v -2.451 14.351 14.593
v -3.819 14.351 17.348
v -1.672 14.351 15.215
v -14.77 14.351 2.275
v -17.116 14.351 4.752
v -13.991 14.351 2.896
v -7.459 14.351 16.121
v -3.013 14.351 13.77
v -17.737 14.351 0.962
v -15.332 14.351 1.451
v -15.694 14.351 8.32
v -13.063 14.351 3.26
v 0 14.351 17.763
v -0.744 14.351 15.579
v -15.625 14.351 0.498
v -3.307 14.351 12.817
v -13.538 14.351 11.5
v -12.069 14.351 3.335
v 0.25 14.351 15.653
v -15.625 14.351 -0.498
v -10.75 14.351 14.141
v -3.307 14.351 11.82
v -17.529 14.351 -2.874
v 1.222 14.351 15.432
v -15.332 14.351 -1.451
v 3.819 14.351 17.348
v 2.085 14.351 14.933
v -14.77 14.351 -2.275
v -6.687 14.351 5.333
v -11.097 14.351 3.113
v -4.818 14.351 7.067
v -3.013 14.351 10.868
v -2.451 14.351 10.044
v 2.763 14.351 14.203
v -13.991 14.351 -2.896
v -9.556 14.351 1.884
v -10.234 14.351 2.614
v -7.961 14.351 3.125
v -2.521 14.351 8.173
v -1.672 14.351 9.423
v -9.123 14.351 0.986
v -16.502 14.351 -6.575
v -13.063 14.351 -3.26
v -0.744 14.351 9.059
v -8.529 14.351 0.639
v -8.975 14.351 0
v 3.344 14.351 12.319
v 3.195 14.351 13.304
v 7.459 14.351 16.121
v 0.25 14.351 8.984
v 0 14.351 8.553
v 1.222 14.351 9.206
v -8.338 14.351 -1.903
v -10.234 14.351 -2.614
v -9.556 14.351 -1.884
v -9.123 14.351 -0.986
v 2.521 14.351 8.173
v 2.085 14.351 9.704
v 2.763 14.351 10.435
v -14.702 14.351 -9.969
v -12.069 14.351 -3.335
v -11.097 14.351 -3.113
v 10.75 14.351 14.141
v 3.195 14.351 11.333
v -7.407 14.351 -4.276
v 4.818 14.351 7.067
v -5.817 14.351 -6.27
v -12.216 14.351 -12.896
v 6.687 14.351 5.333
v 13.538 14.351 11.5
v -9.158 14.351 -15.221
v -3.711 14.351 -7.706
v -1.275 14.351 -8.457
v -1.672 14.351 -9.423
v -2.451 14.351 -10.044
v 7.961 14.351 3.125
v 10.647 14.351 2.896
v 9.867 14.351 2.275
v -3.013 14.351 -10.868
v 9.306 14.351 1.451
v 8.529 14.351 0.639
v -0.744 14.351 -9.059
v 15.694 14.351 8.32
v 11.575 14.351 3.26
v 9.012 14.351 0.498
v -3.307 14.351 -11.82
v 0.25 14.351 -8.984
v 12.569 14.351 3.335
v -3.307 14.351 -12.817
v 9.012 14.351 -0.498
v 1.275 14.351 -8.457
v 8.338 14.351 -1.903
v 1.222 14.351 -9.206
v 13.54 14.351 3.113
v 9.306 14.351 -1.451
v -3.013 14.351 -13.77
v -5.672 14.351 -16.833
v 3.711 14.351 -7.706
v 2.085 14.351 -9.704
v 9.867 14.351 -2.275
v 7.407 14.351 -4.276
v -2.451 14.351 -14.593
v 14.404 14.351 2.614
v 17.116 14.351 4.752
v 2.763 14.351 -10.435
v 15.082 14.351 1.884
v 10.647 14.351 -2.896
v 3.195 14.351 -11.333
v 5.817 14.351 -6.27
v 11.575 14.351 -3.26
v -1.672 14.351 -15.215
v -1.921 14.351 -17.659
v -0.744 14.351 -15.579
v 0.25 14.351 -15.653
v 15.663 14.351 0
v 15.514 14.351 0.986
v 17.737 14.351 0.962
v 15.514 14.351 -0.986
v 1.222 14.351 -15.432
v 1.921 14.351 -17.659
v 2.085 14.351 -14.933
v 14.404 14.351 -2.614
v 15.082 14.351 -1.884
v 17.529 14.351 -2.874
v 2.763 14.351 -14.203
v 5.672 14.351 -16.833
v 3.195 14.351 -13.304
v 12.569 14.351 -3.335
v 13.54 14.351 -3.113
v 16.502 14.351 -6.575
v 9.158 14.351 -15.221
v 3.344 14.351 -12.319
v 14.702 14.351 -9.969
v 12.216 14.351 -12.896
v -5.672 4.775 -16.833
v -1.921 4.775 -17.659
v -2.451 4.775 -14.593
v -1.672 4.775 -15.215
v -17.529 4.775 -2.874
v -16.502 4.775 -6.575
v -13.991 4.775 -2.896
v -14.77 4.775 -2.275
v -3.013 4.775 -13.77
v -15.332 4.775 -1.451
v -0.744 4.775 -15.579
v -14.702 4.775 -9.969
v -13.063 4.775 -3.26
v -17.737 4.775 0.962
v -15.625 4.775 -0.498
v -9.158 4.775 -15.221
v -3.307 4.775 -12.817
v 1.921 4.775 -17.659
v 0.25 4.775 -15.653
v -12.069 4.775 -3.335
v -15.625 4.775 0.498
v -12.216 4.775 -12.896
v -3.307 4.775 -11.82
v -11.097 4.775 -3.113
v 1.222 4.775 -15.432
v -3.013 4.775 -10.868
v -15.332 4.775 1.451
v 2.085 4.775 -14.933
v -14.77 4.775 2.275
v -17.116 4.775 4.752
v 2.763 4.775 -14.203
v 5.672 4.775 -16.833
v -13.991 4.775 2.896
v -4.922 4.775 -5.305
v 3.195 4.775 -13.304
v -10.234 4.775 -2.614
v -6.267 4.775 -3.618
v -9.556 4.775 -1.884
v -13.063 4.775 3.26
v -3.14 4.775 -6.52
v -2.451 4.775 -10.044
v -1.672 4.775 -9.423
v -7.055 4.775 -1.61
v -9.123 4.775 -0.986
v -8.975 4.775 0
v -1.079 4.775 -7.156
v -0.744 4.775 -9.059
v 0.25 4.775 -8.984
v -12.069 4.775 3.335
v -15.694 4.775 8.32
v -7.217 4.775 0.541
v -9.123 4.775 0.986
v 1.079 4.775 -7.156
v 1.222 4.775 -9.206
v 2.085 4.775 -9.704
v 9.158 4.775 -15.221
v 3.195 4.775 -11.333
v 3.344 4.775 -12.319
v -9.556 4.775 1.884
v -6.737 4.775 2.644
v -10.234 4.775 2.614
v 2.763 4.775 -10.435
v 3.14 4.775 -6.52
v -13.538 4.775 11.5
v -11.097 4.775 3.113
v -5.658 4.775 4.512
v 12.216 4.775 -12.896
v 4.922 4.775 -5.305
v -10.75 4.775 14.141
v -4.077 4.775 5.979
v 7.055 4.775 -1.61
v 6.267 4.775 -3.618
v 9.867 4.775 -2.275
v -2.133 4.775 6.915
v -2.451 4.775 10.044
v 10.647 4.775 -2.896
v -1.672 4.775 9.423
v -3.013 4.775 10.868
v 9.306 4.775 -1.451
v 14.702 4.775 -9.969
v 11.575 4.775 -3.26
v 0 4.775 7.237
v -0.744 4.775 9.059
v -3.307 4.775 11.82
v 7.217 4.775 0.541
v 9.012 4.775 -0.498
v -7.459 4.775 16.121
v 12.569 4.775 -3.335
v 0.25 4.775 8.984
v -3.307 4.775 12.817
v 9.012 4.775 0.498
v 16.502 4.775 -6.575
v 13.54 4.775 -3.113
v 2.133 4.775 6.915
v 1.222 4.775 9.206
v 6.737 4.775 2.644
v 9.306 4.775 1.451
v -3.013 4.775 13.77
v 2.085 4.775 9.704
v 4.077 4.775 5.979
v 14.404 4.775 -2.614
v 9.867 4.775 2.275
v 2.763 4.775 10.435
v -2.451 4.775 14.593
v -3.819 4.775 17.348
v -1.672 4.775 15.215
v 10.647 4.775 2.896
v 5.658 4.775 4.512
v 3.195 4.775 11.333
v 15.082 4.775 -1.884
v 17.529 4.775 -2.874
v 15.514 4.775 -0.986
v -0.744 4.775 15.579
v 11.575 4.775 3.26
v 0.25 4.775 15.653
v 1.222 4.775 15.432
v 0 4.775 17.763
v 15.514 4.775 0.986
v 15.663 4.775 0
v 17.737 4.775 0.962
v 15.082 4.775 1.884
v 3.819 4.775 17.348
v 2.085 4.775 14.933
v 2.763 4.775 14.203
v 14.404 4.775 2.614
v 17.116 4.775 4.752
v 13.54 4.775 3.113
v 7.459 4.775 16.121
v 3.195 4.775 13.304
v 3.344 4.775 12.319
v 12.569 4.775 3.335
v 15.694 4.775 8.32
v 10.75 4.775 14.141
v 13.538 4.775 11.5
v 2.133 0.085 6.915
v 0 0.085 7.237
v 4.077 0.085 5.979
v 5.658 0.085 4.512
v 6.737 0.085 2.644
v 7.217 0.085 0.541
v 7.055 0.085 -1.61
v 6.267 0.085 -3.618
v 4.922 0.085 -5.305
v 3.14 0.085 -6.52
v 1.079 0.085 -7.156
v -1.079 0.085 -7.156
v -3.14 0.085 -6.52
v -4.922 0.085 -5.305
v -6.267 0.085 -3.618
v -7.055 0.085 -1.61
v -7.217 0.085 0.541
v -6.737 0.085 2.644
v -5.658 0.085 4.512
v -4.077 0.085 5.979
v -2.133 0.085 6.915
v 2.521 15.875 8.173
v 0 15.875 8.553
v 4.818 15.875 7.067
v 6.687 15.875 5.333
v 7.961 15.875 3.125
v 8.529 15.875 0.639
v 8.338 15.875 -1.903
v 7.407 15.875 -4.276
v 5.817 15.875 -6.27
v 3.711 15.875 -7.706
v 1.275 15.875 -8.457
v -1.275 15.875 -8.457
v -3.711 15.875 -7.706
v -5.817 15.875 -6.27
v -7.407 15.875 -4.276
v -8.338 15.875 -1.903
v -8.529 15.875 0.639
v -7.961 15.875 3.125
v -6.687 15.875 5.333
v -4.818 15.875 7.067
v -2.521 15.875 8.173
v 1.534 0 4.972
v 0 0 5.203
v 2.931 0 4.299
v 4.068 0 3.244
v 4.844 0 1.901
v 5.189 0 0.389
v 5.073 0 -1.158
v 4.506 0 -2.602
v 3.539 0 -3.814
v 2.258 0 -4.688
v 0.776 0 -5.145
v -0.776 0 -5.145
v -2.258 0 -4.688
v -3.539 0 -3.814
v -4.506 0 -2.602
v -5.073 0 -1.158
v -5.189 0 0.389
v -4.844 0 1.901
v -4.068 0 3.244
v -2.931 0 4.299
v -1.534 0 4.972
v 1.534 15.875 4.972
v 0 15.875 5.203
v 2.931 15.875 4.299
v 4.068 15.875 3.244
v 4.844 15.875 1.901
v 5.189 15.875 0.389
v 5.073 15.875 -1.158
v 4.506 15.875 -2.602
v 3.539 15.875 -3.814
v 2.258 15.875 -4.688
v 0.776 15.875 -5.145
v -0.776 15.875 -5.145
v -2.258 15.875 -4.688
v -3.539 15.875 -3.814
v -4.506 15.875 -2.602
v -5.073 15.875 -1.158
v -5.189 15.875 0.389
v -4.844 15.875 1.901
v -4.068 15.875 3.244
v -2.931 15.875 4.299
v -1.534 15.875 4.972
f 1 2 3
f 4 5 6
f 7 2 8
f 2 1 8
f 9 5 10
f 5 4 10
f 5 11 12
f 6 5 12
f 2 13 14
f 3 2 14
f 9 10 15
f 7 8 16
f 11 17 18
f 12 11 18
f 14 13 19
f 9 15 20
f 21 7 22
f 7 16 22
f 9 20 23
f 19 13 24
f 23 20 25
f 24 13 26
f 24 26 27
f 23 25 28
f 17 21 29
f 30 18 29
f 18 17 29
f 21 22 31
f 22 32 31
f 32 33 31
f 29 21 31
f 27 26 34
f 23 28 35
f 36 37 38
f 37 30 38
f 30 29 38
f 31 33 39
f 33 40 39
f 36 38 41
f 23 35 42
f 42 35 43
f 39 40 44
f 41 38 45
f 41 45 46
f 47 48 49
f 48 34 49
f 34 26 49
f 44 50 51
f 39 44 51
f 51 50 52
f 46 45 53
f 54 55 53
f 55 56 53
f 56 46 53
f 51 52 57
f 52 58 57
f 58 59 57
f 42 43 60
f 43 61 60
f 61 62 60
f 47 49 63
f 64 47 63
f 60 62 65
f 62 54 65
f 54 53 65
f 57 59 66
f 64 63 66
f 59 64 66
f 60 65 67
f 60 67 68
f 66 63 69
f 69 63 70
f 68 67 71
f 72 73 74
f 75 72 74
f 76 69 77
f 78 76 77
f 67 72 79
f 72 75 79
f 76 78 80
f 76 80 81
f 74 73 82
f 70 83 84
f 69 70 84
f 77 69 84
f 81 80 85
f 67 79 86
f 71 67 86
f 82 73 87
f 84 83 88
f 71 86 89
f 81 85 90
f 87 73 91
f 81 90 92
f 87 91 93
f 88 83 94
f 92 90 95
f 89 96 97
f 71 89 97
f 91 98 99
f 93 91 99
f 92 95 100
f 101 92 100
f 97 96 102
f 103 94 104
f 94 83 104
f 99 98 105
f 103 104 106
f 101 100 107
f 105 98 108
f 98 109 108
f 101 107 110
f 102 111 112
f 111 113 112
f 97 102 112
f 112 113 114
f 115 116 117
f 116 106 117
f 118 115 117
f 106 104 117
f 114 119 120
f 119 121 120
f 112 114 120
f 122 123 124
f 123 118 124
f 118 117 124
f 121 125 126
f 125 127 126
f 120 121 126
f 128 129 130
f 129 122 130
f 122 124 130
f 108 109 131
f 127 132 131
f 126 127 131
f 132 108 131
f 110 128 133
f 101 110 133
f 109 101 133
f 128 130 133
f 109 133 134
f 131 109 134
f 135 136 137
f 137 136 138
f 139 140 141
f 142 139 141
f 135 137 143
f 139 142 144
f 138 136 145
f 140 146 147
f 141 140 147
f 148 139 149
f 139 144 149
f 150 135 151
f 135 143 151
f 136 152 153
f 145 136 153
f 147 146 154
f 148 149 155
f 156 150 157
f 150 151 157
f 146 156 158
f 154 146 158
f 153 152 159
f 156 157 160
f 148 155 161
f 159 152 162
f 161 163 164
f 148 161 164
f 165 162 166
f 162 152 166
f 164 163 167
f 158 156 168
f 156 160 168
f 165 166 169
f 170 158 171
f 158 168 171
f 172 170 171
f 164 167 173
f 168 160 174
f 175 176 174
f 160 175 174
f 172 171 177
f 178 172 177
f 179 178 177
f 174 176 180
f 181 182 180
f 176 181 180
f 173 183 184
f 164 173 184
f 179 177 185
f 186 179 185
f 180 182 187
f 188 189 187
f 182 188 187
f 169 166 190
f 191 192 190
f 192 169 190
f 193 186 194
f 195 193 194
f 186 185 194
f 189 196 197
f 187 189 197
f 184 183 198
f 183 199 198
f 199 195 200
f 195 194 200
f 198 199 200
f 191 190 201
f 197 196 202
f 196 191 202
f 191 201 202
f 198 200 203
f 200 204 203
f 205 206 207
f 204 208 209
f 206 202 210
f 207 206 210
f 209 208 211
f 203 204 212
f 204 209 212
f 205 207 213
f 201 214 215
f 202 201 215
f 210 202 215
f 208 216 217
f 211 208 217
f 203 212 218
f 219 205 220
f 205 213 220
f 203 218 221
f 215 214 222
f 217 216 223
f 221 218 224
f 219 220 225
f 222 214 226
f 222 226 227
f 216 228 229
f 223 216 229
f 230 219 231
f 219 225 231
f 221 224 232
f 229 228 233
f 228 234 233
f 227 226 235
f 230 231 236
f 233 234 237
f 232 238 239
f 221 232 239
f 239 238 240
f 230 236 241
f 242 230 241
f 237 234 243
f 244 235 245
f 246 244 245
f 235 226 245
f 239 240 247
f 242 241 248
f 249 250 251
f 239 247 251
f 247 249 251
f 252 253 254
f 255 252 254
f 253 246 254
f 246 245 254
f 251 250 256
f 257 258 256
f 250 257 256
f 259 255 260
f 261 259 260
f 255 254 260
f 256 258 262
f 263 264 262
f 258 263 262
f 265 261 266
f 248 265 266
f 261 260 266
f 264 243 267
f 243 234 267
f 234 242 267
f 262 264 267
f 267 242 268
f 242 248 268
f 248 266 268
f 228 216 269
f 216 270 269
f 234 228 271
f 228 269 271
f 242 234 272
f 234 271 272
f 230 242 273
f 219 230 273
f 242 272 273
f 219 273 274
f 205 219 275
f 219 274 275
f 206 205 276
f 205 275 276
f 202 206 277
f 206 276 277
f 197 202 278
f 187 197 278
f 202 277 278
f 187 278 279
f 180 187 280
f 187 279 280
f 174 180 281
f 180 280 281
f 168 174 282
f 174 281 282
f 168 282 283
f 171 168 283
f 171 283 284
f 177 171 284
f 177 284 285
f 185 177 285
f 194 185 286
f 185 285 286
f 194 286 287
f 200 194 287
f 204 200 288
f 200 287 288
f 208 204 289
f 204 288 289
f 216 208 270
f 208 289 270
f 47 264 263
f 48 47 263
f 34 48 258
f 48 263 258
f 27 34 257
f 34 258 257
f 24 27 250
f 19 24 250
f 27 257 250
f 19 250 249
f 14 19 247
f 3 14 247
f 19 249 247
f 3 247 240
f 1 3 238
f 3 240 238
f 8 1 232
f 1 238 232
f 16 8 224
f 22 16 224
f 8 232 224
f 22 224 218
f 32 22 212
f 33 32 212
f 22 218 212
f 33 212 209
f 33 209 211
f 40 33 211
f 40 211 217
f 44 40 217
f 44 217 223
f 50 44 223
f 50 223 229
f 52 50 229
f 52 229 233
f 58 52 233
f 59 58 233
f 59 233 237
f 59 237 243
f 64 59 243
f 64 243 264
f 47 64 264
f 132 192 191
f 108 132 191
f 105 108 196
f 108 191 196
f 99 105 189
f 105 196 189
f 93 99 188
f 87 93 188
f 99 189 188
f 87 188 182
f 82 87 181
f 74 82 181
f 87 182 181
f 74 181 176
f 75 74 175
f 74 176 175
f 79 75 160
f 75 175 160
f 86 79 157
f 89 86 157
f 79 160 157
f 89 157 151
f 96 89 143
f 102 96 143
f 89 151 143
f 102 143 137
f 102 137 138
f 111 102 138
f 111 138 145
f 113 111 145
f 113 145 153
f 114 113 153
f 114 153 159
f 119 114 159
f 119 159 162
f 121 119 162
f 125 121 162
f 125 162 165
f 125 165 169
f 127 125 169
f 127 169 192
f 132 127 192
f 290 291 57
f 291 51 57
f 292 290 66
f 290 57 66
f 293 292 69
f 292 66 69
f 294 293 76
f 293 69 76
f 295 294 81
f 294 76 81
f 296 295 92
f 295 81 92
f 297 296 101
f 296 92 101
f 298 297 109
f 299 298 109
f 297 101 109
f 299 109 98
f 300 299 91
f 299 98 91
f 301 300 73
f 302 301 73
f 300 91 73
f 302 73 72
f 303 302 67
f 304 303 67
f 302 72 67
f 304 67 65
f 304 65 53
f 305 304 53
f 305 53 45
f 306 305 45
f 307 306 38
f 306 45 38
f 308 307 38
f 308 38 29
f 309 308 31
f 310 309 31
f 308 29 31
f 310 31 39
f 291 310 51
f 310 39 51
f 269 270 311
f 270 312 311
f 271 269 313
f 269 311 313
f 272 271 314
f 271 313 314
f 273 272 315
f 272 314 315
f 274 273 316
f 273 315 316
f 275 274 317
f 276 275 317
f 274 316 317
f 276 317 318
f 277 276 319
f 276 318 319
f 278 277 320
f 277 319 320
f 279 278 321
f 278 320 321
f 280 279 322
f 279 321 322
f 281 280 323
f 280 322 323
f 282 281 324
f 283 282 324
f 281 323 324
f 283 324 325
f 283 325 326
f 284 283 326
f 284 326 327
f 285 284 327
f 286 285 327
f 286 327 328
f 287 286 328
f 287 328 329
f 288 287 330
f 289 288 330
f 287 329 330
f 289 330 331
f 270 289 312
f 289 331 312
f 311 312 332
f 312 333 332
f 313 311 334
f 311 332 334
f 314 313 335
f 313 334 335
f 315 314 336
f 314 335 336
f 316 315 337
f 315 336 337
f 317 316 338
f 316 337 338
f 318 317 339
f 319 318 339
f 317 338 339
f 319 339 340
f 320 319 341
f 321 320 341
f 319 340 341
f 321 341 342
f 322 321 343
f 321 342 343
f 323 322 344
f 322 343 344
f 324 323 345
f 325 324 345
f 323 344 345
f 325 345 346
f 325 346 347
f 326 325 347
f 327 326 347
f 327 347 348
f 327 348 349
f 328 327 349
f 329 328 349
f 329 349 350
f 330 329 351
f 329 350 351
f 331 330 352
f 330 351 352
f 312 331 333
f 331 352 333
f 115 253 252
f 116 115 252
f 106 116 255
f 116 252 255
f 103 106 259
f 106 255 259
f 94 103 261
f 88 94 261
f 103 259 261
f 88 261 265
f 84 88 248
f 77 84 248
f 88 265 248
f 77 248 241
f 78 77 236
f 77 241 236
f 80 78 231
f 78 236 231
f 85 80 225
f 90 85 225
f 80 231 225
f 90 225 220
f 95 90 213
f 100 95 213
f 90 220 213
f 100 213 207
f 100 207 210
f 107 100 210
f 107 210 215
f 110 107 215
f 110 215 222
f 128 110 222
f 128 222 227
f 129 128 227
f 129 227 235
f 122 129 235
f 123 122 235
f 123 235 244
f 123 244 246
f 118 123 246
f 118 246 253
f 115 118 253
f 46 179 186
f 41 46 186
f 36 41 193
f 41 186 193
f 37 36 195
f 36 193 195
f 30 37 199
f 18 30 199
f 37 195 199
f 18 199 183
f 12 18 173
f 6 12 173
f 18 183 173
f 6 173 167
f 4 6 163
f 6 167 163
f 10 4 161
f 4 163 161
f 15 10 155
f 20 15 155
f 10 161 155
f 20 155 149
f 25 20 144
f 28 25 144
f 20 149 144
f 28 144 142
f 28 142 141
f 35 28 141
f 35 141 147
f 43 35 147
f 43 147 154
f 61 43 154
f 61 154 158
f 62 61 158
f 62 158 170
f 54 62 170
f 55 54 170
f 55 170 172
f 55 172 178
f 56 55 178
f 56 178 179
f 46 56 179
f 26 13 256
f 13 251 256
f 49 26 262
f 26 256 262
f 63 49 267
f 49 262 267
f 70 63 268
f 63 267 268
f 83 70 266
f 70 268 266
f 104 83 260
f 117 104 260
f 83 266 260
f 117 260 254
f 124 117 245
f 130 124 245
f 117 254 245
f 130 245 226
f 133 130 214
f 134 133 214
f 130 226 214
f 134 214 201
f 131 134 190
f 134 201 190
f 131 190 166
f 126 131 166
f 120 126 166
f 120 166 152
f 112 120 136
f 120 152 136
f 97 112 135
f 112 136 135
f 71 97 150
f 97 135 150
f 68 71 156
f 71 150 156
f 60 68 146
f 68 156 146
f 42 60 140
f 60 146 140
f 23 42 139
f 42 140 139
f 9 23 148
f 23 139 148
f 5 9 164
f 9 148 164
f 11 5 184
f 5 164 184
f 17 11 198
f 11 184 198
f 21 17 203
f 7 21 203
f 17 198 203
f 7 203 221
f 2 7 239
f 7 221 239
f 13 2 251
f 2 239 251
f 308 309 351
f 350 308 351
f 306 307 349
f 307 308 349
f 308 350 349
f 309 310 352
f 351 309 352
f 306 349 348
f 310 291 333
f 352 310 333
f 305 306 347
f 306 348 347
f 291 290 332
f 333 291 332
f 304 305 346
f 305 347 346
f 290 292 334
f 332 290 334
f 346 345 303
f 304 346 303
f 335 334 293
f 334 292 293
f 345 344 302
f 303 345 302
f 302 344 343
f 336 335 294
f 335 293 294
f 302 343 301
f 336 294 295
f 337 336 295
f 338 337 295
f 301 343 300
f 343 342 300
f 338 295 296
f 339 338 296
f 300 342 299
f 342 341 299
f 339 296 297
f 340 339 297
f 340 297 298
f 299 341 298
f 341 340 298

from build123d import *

# Parameters (mm, degrees)
F2_R     = 3.344047
F3_DEPTH = 11.1008


with BuildPart() as f1:
    # F0 (on Right) → F1 (revolve)
    with BuildSketch(Plane.YZ):
        Polygon((0.085442, 7.236881), (0, 5.203378), (15.875, 5.203378), (15.875, 8.552678), (14.351, 8.552678), (14.351, 17.763254), (4.7752, 17.763254), (4.7752, 7.236881), align=None)
    revolve(axis=Axis((0, -0.811693, 0), (0, 1, 0)))

    # F2 (on face) → F3 (cut, through all)
    with BuildSketch(Plane.XZ.offset(-4.7752)):
        with Locations((0, 12.318773)):
            Circle(F2_R)
        with Locations((-12.318773, 0)):
            Circle(F2_R)
        with Locations((0, -12.318773)):
            Circle(F2_R)
        with Locations((12.318773, 0)):
            Circle(F2_R)
    extrude(amount=-F3_DEPTH, mode=Mode.SUBTRACT)


solid = f1.part
